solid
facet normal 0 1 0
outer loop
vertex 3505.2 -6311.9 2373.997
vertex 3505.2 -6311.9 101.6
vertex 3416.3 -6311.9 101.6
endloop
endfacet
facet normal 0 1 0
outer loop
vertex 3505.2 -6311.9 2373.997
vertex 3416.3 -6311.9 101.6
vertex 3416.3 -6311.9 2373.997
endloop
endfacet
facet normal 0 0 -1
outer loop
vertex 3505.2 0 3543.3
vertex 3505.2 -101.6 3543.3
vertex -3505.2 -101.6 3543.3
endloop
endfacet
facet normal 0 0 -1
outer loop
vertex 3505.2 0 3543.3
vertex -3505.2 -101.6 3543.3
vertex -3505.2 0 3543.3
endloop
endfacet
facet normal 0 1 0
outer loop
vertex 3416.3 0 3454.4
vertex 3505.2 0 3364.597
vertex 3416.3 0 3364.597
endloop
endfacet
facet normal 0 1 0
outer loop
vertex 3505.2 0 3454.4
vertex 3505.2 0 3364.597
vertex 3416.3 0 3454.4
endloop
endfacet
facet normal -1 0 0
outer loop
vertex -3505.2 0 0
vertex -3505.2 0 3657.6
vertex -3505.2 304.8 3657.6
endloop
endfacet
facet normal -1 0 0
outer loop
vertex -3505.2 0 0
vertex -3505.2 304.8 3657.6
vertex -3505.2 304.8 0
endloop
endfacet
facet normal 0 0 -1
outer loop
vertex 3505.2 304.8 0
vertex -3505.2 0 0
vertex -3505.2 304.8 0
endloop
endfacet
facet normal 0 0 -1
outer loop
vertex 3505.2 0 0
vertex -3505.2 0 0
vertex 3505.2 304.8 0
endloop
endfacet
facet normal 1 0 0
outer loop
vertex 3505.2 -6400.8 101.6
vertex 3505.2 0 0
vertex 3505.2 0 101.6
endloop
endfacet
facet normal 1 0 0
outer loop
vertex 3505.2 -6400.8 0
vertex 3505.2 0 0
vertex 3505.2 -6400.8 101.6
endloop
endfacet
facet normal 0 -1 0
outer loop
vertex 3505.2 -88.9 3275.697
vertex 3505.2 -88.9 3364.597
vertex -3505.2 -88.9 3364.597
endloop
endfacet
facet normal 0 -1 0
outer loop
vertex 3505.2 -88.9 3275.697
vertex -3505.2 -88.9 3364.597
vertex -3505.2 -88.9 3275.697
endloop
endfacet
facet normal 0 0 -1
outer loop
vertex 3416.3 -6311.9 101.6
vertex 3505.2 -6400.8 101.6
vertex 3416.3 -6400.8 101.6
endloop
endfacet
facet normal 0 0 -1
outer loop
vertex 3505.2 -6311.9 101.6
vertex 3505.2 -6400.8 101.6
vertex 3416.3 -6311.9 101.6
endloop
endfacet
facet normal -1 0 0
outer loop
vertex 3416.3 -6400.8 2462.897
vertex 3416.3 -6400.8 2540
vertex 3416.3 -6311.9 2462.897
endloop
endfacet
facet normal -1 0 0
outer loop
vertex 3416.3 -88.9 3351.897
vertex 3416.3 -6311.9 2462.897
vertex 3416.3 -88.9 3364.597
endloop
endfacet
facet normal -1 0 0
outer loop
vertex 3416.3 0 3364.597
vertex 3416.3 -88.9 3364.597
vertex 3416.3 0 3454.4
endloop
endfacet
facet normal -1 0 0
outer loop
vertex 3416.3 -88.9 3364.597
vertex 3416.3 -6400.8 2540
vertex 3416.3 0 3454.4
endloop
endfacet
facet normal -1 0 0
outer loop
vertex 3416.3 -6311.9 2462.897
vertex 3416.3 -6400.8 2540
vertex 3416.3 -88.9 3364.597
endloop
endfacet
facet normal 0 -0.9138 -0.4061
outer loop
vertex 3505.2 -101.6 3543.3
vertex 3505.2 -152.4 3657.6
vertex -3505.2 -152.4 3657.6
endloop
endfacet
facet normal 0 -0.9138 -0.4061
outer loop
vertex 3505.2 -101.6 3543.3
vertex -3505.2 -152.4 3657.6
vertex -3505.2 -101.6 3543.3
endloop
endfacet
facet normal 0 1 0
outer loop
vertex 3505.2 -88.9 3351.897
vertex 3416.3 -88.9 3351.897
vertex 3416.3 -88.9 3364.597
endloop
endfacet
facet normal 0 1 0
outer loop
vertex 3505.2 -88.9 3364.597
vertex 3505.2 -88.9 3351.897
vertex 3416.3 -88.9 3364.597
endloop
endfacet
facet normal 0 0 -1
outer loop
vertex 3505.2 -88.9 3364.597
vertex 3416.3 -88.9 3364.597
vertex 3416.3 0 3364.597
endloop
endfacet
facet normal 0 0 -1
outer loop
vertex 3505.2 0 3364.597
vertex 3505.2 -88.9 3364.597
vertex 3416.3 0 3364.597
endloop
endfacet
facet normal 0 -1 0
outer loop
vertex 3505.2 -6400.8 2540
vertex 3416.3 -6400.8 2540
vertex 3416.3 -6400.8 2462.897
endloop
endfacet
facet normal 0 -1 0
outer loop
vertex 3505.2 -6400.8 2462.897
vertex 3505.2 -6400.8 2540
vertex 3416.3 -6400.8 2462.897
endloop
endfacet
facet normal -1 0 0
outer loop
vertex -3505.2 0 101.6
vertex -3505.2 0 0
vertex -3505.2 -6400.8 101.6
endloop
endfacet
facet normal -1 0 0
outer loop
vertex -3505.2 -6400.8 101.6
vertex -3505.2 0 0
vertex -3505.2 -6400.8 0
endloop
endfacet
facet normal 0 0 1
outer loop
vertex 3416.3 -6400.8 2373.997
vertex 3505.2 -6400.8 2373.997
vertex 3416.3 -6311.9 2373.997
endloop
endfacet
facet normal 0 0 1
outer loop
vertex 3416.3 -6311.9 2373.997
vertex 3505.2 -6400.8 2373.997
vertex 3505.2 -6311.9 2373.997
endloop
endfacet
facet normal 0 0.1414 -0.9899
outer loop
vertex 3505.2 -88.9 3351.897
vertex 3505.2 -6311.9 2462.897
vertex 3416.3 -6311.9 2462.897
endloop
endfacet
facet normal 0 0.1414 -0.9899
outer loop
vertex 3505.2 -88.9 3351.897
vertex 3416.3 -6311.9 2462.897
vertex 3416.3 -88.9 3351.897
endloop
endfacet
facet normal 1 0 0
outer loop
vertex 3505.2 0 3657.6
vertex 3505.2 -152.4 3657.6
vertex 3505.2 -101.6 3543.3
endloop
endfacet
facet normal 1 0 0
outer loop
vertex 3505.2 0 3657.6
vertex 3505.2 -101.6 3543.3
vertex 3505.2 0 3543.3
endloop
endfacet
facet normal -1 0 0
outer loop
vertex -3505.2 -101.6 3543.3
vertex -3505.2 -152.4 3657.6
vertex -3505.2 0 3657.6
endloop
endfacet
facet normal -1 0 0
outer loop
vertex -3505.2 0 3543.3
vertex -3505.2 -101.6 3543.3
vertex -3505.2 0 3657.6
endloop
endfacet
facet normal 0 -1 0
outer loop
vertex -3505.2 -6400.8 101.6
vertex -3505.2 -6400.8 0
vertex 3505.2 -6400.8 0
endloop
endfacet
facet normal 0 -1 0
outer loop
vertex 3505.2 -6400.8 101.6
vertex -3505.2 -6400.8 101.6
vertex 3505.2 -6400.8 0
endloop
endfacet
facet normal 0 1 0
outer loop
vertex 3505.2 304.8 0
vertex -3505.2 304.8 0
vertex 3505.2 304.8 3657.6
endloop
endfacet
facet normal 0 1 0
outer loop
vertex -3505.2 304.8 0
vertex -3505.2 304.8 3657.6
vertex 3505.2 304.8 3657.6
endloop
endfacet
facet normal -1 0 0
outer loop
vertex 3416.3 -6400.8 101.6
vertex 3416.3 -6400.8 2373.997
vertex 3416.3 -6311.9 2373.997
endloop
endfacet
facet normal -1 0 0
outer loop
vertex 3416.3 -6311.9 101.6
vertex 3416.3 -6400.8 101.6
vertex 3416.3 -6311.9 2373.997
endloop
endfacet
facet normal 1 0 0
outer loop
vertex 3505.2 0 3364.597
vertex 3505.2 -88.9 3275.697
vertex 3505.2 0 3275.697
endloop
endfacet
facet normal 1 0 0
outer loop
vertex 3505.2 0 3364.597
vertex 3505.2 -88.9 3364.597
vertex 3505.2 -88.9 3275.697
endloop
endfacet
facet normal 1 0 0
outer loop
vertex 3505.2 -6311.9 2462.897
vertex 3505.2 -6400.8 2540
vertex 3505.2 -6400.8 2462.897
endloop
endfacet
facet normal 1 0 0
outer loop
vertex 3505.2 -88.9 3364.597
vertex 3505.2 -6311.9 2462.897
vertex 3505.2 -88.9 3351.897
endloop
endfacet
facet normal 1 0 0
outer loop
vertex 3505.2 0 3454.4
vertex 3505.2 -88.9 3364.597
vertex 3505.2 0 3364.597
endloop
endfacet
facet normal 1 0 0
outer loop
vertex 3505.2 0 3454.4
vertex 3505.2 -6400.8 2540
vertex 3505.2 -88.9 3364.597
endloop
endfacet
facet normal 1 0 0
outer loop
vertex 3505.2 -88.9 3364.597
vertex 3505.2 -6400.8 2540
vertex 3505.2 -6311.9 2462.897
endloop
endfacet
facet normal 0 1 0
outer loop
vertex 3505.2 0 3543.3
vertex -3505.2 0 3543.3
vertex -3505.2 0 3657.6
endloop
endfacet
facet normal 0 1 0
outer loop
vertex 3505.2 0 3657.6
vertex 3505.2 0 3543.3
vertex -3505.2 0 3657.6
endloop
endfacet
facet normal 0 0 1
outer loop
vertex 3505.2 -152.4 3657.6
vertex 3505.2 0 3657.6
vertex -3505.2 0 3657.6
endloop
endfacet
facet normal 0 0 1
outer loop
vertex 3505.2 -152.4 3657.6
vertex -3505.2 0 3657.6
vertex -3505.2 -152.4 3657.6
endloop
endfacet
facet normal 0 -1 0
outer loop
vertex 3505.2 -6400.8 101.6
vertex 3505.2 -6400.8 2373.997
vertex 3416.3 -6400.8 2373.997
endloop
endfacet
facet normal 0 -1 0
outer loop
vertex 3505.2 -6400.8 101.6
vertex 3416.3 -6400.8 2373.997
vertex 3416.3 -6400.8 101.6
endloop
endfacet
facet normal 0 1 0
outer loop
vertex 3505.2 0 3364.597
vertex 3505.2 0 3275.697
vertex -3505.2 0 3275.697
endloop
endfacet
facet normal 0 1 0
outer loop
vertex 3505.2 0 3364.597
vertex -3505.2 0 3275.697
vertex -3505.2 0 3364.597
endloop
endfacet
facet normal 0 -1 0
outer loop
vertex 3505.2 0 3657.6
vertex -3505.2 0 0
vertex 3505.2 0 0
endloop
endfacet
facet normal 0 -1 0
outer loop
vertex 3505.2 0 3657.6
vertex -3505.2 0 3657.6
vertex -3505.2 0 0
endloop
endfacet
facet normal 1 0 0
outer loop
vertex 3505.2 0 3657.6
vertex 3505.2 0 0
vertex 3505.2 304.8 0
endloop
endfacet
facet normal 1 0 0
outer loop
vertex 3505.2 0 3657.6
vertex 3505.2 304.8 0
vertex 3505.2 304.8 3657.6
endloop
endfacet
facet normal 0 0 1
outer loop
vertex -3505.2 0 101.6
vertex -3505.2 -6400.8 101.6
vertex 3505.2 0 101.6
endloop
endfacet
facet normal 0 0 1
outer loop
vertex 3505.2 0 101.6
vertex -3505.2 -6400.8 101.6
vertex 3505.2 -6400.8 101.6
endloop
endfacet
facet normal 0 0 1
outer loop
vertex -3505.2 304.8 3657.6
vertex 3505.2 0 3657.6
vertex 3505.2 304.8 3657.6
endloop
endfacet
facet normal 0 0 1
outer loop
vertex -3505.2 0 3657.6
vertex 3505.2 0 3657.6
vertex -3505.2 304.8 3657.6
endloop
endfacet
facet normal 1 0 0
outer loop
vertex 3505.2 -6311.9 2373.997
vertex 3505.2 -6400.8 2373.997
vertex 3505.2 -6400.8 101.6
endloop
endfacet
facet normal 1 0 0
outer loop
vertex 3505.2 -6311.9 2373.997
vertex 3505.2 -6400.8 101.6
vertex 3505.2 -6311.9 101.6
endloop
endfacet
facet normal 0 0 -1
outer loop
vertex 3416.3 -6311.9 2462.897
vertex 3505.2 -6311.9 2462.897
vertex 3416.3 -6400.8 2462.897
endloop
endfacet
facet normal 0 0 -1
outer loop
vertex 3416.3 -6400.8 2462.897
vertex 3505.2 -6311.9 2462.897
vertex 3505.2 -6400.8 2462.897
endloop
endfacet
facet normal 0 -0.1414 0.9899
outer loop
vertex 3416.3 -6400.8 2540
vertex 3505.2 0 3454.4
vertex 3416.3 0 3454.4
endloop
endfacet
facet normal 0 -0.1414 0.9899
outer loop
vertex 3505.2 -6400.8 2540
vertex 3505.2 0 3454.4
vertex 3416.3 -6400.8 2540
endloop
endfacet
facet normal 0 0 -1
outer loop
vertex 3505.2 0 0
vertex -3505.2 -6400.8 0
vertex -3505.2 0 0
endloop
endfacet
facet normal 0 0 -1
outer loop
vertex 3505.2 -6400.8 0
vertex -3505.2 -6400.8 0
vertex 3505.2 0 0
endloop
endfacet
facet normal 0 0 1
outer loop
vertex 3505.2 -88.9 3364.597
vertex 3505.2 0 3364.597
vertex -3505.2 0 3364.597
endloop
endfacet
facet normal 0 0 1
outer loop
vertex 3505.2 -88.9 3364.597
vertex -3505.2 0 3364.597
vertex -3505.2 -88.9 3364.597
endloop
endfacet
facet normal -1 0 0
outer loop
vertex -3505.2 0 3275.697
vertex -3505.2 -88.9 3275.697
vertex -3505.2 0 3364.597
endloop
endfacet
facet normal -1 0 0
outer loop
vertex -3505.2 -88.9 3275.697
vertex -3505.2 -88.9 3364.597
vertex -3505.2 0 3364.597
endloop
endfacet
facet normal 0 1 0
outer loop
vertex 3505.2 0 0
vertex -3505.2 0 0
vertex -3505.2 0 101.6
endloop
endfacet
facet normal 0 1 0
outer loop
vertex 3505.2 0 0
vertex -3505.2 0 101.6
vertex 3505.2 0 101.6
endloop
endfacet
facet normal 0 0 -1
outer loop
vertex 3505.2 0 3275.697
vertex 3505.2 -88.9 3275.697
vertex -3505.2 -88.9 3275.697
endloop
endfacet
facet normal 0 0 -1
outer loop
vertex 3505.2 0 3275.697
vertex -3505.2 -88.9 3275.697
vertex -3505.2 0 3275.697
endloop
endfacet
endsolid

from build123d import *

# Parameters (mm, degrees)
F2_DEPTH  = 304.8
F4_DEPTH  = 7010.4
F1_E1_W   = 3505.2
F1_E1_H   = 6400.8
F1_E0_W   = 3505.2
F1_E0_H   = 6400.8
F5_DEPTH  = 101.6
F7_DEPTH  = 88.9
F8_DEPTH  = 88.9
F9_DEPTH  = 7010.4
F11_DEPTH = 88.9


with BuildPart() as f2:
    # F0 (on Front) → F2 (new body)
    with BuildSketch(Plane.XZ):
        Polygon((-3505.2, 0), (0, 0), (3505.2, 0), (3505.2, 3657.6), (-3505.2, 3657.6), align=None)
    extrude(amount=-F2_DEPTH)


with BuildPart() as f4:
    # F3 (on face) → F4 (new body)
    with BuildSketch(Plane.YZ.offset(3505.2)):
        Polygon((0, 3543.3), (0, 3657.6), (-152.4, 3657.6), (-101.6, 3543.3), align=None)
    extrude(amount=-F4_DEPTH)


with BuildPart() as f5:
    # F1_E1 (on explicit) + F1_E0 (on explicit) → F5 (new body)
    with BuildSketch(Plane(origin=(0, 0, 0), x_dir=(-1, 0, 0), z_dir=(0, 0, 1))):
        with Locations((1752.6, 3200.4)):
            Rectangle(F1_E1_W, F1_E1_H)
    with BuildSketch(Plane(origin=(0, 0, 0), x_dir=(1, 0, 0), z_dir=(0, 0, -1))):
        with Locations((1752.6, 3200.4)):
            Rectangle(F1_E0_W, F1_E0_H)
    extrude(amount=F5_DEPTH, dir=(0, 0, 1))


with BuildPart() as f7:
    # F6 (on face) → F7 (new body)
    with BuildSketch(Plane.YZ.offset(3505.2)):
        Polygon((-6400.8, 101.6), (-6311.9, 101.6), (-6311.9, 2462.8974387893), (-6400.8, 2450.1974387893), align=None)
    extrude(amount=-F7_DEPTH)


with BuildPart() as f8:
    # F6 (on face) → F8 (new body)
    with BuildSketch(Plane.YZ.offset(3505.2)):
        Polygon((-88.9, 3364.5974387893), (0, 3364.5974387893), (0, 3454.4), (-6400.8, 2540), (-6400.8, 2450.1974387893), (-6311.9, 2462.8974387893), (-88.9, 3351.8974387893), align=None)
    extrude(amount=-F8_DEPTH)


with BuildPart() as f9:
    # F6 (on face) → F9 (new body)
    with BuildSketch(Plane.YZ.offset(3505.2)):
        Polygon((-88.9, 3275.6974387893), (0, 3275.6974387893), (0, 3364.5974387893), (-88.9, 3351.8974387893), align=None)
        Polygon((-88.9, 3351.8974387893), (0, 3364.5974387893), (-88.9, 3364.5974387893), align=None)
    extrude(amount=-F9_DEPTH)


with BuildPart() as f11_tool:
    # F10 (on face) → F11 (new body)
    with BuildSketch(Plane.YZ.offset(3505.2)):
        Polygon((-6311.9, 2373.9974387893), (-6311.9, 2462.8974387893), (-6400.8, 2450.1974387893), (-6400.8, 2373.9974387893), align=None)
        Polygon((-6400.8, 2450.1974387893), (-6311.9, 2462.8974387893), (-6400.8, 2462.8974387893), align=None)
    extrude(amount=-F11_DEPTH)


with BuildPart() as f7_1:
    add(f7.part)

    # F11: cut by f11_tool
    add(f11_tool.part, mode=Mode.SUBTRACT)


with BuildPart() as f8_1:
    add(f8.part)

    # F11: cut by f11_tool
    add(f11_tool.part, mode=Mode.SUBTRACT)


solid = Compound([f2.part, f4.part, f5.part, f9.part, f7_1.part, f8_1.part])
